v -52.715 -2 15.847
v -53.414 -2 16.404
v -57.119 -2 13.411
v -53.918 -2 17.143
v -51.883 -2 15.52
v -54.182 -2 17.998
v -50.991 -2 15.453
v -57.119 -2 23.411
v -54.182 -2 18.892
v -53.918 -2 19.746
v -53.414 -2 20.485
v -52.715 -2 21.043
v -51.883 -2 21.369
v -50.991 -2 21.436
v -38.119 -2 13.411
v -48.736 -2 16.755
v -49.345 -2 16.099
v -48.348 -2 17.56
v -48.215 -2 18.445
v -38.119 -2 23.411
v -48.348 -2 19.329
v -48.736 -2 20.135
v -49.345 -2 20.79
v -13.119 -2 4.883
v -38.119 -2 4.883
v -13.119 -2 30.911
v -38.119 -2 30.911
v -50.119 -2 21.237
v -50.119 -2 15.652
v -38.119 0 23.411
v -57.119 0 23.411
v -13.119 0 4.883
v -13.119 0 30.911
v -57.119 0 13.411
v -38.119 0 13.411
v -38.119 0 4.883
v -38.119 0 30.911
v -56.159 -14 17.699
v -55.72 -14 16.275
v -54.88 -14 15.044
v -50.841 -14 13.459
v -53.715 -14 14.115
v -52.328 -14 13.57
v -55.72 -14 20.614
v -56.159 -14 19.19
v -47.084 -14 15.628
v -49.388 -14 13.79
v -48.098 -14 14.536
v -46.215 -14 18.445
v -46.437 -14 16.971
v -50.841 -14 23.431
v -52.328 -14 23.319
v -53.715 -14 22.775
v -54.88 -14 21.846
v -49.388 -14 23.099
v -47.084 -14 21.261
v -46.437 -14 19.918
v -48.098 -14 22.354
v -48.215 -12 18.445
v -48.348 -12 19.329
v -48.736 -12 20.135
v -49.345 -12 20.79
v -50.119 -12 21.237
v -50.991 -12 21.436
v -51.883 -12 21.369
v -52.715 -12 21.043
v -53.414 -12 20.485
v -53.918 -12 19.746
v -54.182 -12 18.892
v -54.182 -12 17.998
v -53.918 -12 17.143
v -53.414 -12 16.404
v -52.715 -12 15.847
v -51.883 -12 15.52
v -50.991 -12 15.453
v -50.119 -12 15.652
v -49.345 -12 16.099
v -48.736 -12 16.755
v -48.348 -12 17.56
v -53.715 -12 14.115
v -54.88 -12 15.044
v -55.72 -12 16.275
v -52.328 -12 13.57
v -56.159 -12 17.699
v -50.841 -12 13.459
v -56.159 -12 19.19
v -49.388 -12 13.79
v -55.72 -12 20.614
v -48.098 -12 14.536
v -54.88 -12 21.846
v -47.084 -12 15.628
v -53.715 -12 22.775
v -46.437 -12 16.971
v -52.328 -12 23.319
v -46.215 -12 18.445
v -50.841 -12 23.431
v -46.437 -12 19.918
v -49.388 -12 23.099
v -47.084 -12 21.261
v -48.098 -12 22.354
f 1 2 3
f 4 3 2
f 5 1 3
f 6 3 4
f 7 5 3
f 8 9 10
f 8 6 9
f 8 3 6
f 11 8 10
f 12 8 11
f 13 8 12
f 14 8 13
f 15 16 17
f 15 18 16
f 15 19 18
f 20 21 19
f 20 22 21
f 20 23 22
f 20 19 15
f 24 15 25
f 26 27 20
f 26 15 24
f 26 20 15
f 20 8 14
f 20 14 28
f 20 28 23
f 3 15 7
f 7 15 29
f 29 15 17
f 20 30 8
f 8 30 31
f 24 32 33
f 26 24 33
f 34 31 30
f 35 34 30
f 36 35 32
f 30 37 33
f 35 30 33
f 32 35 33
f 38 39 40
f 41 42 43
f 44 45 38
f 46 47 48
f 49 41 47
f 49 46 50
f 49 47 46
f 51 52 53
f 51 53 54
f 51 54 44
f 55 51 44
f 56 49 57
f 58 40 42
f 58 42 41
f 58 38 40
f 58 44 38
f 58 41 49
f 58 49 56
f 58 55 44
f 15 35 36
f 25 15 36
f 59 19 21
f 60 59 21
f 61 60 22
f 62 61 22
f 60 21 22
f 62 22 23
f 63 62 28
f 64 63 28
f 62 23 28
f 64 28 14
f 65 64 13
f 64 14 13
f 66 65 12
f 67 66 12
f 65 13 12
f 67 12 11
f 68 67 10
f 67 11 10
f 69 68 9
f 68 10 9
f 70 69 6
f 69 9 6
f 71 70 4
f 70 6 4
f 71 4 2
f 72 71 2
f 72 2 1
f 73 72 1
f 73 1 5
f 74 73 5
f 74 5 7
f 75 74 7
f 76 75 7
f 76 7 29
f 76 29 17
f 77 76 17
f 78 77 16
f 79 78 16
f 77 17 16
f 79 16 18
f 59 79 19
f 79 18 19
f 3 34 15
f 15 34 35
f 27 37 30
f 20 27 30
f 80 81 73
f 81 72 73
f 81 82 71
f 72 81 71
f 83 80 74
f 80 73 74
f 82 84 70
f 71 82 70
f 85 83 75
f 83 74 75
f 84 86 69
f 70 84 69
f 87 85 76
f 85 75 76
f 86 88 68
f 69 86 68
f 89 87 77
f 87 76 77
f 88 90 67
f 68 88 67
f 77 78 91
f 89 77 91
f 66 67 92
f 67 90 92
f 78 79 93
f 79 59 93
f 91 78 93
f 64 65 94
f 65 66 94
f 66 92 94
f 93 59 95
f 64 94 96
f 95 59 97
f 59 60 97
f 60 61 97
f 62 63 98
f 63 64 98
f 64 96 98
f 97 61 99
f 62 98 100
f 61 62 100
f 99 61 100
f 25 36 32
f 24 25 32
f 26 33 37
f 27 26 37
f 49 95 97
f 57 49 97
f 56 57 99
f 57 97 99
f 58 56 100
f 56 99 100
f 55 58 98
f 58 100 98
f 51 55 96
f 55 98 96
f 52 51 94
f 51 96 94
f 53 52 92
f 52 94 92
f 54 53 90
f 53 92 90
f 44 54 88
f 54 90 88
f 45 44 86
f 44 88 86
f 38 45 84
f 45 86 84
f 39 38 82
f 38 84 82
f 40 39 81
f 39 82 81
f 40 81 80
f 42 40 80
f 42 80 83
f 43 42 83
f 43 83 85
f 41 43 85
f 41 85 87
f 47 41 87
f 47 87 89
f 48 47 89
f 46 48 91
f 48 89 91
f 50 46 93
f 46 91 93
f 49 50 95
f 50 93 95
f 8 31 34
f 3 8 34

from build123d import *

# Parameters (mm, degrees)
F1_DEPTH = 2
F2_R     = 3
F3_DEPTH = 10
F4_R     = 5
F5_DEPTH = 2


with BuildPart() as f1:
    # F0 (on Front) → F1 (new body)
    with BuildSketch(Plane.XZ):
        Polygon((-13.119209, 30.910596), (-38.119209, 30.910596), (-38.119209, 23.410596), (-57.119209, 23.410596), (-57.119209, 13.410596), (-38.119209, 13.410596), (-38.119209, 4.883048), (-13.119209, 4.883048), align=None)
    extrude(amount=F1_DEPTH)

    # F2 (on face) → F3 (join)
    with BuildSketch(Plane.XZ.offset(2)):
        with Locations((-51.215012, 18.444663)):
            Circle(F2_R)
    extrude(amount=F3_DEPTH)

    # F4 (on face) → F5 (join)
    with BuildSketch(Plane.XZ.offset(12)):
        with Locations((-51.215012, 18.444663)):
            Circle(F4_R)
    extrude(amount=F5_DEPTH)


solid = f1.part
